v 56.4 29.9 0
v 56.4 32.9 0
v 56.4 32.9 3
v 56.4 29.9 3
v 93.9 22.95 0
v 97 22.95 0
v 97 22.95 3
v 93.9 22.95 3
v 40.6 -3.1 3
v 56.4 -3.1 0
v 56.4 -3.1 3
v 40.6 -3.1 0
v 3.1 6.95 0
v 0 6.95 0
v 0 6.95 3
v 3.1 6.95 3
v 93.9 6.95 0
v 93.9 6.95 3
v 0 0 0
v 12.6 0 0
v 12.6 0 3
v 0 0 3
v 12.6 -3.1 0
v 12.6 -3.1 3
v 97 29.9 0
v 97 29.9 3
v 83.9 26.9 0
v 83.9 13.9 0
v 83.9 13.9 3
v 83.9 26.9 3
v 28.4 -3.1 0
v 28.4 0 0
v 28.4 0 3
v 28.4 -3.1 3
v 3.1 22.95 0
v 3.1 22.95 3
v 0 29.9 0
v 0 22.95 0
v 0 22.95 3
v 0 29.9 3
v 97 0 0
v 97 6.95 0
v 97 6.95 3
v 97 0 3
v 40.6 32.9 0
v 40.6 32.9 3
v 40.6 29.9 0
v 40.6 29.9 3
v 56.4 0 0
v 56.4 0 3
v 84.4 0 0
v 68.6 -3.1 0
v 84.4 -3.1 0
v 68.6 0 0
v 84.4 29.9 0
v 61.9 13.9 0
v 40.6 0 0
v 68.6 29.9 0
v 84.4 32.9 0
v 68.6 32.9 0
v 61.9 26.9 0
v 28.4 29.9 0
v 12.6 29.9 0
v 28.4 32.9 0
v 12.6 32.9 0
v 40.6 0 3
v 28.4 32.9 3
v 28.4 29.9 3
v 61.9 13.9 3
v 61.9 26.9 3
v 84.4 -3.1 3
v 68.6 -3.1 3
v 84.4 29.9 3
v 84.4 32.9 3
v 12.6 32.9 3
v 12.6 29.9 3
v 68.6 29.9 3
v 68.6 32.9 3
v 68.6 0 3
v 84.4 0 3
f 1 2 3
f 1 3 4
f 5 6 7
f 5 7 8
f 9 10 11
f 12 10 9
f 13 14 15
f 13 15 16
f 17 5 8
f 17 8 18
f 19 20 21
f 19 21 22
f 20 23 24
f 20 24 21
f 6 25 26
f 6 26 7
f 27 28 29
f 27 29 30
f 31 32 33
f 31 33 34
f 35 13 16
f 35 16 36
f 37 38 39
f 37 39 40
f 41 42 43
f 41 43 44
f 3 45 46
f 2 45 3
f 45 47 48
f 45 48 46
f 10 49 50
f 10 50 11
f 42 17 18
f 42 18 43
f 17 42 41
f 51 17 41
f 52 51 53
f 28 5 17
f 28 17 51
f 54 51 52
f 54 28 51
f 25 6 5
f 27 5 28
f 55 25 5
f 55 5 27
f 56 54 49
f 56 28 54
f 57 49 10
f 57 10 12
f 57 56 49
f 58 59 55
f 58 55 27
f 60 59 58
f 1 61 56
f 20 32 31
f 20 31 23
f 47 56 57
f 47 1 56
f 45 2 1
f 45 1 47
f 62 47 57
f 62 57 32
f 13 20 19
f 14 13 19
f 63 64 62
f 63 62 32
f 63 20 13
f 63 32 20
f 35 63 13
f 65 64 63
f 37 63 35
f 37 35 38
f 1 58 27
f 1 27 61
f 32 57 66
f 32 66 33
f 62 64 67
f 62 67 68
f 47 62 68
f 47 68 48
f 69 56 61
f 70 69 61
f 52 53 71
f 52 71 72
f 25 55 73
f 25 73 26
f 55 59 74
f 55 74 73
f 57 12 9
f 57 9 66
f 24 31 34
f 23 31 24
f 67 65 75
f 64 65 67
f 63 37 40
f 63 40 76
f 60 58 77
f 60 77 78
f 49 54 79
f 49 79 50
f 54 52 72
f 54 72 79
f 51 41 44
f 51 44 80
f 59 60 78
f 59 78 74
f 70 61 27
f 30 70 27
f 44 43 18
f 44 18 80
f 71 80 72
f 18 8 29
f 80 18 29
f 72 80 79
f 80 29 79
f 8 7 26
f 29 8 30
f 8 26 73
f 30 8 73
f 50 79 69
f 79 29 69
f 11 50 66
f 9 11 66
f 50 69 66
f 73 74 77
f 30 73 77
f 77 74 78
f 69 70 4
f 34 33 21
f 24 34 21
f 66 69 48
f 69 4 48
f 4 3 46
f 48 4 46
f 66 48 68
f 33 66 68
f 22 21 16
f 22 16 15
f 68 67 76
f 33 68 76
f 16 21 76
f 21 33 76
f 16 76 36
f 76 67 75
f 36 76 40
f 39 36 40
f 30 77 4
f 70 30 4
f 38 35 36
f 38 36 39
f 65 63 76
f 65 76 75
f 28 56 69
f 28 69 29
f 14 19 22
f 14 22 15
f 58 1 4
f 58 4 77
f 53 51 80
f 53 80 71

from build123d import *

# Parameters (mm, degrees)
SKETCH1_W           = 22
SKETCH1_H           = 13
BOSS_EXTRUDE1_DEPTH = 3


with BuildPart() as part:
    # Sketch1 → Boss-Extrude1 (new body)
    with BuildSketch(Plane.XY):
        Polygon((0, 29.9), (12.6, 29.9), (12.6, 32.9), (28.4, 32.9), (28.4, 29.9), (40.6, 29.9), (40.6, 32.9), (56.4, 32.9), (56.4, 29.9), (68.6, 29.9), (68.6, 32.9), (84.4, 32.9), (84.4, 29.9), (97, 29.9), (97, 22.95), (93.9, 22.95), (93.9, 6.95), (97, 6.95), (97, 0), (84.4, 0), (84.4, -3.1), (68.6, -3.1), (68.6, 0), (56.4, 0), (56.4, -3.1), (40.6, -3.1), (40.6, 0), (28.4, 0), (28.4, -3.1), (12.6, -3.1), (12.6, 0), (0, 0), (0, 6.95), (3.1, 6.95), (3.1, 22.95), (0, 22.95), align=None)
        with Locations((72.9, 20.4)):
            Rectangle(SKETCH1_W, SKETCH1_H, mode=Mode.SUBTRACT)
    extrude(amount=BOSS_EXTRUDE1_DEPTH)


solid = part.part
